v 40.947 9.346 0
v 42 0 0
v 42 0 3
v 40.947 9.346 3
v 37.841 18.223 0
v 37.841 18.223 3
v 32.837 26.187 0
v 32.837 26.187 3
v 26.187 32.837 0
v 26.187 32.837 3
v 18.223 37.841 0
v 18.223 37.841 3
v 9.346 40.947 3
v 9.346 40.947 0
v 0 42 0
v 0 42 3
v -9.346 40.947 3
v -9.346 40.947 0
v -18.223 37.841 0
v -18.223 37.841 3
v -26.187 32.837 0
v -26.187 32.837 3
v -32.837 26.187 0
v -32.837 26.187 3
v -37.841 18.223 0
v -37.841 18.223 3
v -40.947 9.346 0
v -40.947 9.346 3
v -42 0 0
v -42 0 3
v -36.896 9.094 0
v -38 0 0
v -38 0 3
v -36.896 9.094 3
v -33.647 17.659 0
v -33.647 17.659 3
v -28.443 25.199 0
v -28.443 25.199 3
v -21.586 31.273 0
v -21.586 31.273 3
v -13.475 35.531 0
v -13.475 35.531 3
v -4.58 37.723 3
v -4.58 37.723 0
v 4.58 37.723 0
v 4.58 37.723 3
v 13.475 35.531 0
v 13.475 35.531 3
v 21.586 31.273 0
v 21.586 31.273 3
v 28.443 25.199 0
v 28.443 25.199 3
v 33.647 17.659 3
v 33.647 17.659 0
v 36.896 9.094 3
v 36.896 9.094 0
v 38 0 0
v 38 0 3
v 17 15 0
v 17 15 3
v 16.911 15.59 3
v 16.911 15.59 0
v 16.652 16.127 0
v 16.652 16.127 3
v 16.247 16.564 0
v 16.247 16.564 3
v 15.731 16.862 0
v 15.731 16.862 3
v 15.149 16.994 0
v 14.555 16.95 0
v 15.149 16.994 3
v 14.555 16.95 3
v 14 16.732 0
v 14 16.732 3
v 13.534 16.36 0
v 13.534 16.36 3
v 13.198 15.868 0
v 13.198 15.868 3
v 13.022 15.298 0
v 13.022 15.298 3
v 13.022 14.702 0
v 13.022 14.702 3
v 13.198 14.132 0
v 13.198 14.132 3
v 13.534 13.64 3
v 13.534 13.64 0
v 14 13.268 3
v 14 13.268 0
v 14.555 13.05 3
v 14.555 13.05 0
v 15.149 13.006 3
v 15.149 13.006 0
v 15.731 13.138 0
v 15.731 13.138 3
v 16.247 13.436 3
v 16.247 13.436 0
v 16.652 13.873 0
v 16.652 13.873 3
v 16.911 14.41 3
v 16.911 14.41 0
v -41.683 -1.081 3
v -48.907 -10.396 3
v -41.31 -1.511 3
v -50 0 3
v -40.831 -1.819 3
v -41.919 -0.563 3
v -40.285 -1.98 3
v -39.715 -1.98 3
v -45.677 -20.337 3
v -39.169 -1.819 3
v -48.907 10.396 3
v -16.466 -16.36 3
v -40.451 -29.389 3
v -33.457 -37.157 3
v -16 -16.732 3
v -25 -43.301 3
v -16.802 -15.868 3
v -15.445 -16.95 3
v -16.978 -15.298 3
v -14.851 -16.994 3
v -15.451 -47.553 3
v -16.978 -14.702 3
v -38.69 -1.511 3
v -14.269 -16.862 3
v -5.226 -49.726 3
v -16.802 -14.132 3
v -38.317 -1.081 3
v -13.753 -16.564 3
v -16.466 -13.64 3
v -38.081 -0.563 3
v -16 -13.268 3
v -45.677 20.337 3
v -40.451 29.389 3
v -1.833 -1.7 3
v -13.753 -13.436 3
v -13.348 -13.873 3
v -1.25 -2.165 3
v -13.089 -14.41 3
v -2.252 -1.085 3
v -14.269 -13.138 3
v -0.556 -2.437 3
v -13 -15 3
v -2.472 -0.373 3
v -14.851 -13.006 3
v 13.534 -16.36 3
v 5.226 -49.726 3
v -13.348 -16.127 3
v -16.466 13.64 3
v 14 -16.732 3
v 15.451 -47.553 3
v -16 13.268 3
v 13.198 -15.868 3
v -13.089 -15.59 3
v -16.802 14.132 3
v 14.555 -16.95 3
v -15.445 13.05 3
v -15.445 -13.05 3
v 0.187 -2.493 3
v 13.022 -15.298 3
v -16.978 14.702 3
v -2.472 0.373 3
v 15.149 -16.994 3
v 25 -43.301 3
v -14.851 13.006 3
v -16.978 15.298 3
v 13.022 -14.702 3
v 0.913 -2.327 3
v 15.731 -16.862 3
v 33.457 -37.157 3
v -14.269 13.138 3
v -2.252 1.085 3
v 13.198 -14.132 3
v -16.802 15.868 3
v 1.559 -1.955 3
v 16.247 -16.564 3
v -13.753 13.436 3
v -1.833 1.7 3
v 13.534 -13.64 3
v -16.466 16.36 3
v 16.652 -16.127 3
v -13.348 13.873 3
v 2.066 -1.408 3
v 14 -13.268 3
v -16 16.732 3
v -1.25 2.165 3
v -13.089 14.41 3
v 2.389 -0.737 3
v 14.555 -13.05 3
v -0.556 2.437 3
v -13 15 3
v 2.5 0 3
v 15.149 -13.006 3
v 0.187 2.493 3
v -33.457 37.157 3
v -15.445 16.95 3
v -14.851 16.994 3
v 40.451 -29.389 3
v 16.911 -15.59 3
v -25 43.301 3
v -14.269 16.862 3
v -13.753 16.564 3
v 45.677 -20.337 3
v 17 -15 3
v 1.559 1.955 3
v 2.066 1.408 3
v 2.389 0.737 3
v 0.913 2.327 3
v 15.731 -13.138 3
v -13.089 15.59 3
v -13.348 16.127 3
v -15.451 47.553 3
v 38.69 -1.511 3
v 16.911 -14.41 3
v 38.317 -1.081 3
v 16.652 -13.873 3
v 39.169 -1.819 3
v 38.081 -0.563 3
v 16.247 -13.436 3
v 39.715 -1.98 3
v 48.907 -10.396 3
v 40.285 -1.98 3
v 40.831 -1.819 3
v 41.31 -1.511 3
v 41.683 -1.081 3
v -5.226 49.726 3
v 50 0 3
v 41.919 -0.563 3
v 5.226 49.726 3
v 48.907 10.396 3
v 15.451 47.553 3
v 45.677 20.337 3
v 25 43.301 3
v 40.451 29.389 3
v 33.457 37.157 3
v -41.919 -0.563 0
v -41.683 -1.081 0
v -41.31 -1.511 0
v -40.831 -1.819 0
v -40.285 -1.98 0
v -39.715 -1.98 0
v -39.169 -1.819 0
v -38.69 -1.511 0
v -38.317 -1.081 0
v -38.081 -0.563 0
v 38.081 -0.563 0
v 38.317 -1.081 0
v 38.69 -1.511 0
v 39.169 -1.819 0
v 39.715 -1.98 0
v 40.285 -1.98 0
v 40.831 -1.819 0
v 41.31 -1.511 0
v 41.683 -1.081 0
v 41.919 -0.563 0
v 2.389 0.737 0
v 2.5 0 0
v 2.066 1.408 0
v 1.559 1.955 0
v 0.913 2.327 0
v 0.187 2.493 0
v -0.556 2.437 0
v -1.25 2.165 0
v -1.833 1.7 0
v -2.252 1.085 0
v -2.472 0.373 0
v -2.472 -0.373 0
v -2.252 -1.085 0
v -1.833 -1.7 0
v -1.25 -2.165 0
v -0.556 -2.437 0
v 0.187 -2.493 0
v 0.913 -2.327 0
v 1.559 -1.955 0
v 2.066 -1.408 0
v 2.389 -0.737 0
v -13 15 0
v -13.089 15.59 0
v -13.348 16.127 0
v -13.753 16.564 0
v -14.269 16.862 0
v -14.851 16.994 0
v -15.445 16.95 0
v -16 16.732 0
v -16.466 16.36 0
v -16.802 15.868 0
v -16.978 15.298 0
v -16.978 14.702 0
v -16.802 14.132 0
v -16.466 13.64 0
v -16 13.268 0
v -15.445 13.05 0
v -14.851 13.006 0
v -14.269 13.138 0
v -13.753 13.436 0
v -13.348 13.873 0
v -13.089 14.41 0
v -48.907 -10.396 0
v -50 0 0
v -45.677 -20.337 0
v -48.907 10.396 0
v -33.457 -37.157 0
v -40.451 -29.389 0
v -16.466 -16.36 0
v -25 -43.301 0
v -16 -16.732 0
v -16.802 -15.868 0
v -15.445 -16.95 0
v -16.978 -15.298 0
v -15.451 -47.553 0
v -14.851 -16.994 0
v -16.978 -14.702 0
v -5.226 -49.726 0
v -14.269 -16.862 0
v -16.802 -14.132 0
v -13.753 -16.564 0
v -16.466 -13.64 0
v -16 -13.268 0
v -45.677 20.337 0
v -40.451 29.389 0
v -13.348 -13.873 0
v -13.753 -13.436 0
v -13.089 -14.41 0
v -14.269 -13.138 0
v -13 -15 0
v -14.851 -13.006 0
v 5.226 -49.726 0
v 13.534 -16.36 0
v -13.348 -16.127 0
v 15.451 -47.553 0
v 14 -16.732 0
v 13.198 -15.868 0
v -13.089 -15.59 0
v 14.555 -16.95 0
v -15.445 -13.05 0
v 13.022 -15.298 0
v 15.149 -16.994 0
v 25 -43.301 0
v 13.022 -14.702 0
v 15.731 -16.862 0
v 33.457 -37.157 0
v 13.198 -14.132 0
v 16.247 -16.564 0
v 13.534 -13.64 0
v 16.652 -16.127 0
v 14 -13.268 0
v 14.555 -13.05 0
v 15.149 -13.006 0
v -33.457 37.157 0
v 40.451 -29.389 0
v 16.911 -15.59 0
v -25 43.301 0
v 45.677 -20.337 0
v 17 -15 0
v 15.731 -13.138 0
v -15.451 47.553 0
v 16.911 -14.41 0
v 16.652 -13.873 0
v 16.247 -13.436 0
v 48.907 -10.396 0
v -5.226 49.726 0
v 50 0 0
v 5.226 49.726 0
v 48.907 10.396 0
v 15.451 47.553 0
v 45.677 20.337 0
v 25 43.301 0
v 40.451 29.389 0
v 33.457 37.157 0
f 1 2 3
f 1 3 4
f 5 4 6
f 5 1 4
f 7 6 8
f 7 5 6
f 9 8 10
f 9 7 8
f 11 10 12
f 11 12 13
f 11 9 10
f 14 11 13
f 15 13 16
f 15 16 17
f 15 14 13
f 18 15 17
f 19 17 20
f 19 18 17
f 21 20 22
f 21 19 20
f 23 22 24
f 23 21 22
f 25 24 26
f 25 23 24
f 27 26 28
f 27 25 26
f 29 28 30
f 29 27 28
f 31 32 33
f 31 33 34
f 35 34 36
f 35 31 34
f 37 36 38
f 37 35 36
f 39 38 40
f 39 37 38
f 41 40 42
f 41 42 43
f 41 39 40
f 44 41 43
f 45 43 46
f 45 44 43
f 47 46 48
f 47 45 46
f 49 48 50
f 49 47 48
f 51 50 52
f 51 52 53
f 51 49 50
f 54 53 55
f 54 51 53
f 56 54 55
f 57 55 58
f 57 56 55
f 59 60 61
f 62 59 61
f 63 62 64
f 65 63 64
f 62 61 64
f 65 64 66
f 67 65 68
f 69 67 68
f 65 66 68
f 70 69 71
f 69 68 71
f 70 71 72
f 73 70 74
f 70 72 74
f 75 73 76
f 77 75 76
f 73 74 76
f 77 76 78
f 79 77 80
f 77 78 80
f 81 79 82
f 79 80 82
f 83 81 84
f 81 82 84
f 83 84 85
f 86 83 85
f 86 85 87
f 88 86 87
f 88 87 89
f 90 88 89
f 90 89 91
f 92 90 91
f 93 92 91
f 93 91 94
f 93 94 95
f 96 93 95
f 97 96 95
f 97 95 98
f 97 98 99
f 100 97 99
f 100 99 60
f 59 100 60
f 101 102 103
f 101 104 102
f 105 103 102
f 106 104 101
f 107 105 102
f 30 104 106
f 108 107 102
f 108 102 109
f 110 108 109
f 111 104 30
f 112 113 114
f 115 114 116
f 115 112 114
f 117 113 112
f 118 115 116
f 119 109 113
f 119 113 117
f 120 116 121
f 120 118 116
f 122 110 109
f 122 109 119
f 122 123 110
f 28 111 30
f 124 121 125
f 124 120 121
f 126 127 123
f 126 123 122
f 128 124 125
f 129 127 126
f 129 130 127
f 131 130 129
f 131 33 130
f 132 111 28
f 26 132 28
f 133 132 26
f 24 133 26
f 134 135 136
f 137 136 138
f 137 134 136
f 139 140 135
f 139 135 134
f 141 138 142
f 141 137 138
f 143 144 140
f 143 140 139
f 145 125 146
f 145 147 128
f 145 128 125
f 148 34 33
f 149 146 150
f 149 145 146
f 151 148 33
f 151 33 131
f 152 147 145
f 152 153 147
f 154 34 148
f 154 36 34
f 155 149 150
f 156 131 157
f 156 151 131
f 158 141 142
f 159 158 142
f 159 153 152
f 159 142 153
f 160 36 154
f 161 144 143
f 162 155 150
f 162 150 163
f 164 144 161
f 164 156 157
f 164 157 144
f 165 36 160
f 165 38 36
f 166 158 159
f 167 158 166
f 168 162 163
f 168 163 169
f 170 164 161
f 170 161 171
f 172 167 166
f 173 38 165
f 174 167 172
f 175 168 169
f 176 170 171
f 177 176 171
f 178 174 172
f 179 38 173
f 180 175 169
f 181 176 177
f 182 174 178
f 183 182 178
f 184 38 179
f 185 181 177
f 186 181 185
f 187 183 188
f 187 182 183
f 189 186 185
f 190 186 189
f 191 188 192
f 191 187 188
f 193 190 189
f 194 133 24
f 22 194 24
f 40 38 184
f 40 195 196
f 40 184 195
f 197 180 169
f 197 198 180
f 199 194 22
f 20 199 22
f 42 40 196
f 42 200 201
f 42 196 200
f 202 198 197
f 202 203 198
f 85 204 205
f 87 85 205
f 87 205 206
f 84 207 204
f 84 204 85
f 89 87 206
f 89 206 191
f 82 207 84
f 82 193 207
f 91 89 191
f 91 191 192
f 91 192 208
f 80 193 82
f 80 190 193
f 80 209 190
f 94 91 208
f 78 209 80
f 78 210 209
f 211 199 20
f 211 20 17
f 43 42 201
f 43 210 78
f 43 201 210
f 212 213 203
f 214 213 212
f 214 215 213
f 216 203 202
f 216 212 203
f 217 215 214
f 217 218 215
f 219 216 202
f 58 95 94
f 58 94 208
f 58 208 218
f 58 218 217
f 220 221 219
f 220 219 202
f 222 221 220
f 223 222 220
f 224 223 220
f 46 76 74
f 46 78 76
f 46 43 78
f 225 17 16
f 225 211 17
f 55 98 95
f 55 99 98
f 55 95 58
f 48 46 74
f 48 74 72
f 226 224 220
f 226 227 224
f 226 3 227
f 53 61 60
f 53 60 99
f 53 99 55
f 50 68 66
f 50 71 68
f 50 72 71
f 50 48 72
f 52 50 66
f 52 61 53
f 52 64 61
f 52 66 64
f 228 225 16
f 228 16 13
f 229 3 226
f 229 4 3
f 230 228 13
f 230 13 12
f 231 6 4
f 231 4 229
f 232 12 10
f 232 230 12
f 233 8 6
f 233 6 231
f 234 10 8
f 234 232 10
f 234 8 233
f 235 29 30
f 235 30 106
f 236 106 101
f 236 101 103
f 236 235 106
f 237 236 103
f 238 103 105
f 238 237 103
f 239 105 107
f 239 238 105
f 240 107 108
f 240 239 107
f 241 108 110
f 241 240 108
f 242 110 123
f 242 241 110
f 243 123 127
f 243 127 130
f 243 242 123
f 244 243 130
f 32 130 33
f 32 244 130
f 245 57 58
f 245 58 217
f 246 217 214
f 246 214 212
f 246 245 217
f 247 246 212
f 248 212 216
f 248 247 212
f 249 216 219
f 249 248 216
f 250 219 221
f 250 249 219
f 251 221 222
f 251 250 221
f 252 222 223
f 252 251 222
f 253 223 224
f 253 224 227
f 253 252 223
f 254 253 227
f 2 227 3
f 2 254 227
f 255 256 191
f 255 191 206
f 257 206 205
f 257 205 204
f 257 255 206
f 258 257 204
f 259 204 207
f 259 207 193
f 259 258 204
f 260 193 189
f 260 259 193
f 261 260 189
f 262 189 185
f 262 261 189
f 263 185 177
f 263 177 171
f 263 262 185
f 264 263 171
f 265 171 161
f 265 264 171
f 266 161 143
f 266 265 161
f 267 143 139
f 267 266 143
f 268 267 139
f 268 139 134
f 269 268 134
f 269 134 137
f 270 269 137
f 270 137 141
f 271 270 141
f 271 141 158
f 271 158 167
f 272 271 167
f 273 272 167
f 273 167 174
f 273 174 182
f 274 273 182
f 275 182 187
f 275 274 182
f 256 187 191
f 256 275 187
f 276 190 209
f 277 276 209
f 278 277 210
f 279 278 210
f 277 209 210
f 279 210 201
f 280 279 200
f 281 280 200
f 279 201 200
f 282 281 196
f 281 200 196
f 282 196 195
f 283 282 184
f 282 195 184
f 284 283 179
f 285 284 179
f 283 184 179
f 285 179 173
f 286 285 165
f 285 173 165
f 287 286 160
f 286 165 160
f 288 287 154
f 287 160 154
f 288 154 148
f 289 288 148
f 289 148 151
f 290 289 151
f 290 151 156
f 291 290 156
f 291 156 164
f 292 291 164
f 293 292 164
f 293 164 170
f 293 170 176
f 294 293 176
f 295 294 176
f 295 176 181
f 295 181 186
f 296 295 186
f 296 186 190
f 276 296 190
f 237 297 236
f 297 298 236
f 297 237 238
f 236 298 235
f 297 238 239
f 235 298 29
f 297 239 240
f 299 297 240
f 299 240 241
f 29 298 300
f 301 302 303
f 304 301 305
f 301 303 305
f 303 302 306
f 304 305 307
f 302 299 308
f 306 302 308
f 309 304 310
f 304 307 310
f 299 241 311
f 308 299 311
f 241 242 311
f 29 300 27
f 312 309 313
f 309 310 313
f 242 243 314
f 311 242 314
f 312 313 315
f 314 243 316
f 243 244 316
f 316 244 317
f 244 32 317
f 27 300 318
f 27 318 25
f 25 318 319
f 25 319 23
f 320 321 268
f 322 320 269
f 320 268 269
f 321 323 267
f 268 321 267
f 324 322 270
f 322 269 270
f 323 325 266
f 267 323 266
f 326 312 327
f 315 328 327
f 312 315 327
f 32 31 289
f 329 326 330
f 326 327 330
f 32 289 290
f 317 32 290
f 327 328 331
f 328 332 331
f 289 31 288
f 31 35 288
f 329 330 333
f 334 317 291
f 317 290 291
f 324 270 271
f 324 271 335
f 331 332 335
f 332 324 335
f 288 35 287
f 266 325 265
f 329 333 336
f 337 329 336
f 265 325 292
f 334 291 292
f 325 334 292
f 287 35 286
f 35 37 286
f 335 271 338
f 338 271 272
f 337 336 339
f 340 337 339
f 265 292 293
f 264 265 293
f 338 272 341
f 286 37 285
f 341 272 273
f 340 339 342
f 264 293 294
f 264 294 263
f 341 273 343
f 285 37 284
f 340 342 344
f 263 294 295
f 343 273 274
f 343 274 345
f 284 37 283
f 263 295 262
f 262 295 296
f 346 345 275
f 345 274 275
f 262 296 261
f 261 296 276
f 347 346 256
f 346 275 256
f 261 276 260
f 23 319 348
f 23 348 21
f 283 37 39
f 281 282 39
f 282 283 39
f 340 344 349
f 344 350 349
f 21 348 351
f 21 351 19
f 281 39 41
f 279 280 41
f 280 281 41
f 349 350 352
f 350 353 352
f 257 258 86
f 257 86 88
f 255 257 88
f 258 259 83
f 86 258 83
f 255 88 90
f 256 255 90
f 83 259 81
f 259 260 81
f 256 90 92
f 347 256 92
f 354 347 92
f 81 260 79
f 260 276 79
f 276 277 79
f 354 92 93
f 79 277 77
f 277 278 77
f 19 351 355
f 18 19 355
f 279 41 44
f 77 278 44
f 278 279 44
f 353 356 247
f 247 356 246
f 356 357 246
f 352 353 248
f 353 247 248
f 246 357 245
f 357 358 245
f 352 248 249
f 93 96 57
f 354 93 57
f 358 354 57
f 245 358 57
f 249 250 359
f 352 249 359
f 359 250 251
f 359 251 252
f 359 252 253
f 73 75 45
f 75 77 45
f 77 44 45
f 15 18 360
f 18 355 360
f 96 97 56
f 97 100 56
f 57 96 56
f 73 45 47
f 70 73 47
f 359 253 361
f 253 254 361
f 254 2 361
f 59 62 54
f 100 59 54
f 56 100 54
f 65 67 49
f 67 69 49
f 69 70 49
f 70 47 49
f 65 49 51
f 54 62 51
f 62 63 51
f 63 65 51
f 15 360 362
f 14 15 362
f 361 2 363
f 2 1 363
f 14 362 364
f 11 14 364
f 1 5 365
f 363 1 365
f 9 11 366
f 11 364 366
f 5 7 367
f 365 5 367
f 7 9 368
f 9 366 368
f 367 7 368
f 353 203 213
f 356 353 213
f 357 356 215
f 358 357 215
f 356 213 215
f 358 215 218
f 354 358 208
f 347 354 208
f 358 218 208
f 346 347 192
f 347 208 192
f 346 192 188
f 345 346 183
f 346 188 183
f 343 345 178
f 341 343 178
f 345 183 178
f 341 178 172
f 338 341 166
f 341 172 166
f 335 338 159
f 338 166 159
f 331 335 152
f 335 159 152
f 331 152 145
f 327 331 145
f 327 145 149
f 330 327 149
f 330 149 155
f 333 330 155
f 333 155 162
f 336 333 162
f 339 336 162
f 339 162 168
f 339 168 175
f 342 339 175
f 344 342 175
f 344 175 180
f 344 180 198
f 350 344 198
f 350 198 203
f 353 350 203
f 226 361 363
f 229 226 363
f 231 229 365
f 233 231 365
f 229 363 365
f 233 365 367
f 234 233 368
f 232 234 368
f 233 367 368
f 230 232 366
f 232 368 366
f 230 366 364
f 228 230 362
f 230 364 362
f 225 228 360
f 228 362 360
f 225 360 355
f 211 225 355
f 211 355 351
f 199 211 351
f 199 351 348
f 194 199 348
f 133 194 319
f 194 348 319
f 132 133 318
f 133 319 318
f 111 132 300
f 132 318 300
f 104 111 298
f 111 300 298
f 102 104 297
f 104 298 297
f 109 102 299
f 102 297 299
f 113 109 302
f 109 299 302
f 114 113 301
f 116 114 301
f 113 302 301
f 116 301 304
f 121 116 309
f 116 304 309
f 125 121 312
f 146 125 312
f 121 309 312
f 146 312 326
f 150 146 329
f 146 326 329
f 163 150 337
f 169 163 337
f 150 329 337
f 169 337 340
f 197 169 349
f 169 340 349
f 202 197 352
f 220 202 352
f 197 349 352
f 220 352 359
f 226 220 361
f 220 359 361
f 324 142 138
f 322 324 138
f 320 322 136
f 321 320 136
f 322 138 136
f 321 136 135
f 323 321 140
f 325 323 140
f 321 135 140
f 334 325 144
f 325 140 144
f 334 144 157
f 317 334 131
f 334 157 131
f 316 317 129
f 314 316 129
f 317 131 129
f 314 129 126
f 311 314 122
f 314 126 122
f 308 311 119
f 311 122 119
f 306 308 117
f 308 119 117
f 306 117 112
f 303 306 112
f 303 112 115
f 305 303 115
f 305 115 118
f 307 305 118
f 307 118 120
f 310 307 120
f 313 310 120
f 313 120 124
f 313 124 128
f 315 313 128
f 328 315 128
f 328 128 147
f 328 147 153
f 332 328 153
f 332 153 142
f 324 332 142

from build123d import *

# Parameters (mm, degrees)
SKETCH1_R           = 50
SKETCH1_R_2         = 2.5
BOSS_EXTRUDE1_DEPTH = 3
SKETCH2_R           = 2
CUT_EXTRUDE1_DEPTH  = 4


with BuildPart() as part:
    # Sketch1 → Boss-Extrude1 (new body)
    with BuildSketch(Plane.XY):
        Circle(SKETCH1_R)
        Circle(SKETCH1_R_2, mode=Mode.SUBTRACT)
        with BuildLine():
            ThreePointArc((42, 0), (0, 42), (-42, 0))
            ThreePointArc((-42, 0), (-40, -2), (-38, 0))
            ThreePointArc((-38, 0), (0, 38), (38, 0))
            ThreePointArc((38, 0), (40, -2), (42, 0))
        make_face(mode=Mode.SUBTRACT)
    extrude(amount=BOSS_EXTRUDE1_DEPTH)

    # Sketch2 → Cut-Extrude1 (cut, through all)
    with BuildSketch(Plane.XY.offset(3)):
        with Locations((-15, 15)):
            Circle(SKETCH2_R)
        with Locations((15, 15)):
            Circle(SKETCH2_R)
        with Locations((15, -15)):
            Circle(SKETCH2_R)
        with Locations((-15, -15)):
            Circle(SKETCH2_R)
    extrude(amount=-CUT_EXTRUDE1_DEPTH, mode=Mode.SUBTRACT)


solid = part.part
